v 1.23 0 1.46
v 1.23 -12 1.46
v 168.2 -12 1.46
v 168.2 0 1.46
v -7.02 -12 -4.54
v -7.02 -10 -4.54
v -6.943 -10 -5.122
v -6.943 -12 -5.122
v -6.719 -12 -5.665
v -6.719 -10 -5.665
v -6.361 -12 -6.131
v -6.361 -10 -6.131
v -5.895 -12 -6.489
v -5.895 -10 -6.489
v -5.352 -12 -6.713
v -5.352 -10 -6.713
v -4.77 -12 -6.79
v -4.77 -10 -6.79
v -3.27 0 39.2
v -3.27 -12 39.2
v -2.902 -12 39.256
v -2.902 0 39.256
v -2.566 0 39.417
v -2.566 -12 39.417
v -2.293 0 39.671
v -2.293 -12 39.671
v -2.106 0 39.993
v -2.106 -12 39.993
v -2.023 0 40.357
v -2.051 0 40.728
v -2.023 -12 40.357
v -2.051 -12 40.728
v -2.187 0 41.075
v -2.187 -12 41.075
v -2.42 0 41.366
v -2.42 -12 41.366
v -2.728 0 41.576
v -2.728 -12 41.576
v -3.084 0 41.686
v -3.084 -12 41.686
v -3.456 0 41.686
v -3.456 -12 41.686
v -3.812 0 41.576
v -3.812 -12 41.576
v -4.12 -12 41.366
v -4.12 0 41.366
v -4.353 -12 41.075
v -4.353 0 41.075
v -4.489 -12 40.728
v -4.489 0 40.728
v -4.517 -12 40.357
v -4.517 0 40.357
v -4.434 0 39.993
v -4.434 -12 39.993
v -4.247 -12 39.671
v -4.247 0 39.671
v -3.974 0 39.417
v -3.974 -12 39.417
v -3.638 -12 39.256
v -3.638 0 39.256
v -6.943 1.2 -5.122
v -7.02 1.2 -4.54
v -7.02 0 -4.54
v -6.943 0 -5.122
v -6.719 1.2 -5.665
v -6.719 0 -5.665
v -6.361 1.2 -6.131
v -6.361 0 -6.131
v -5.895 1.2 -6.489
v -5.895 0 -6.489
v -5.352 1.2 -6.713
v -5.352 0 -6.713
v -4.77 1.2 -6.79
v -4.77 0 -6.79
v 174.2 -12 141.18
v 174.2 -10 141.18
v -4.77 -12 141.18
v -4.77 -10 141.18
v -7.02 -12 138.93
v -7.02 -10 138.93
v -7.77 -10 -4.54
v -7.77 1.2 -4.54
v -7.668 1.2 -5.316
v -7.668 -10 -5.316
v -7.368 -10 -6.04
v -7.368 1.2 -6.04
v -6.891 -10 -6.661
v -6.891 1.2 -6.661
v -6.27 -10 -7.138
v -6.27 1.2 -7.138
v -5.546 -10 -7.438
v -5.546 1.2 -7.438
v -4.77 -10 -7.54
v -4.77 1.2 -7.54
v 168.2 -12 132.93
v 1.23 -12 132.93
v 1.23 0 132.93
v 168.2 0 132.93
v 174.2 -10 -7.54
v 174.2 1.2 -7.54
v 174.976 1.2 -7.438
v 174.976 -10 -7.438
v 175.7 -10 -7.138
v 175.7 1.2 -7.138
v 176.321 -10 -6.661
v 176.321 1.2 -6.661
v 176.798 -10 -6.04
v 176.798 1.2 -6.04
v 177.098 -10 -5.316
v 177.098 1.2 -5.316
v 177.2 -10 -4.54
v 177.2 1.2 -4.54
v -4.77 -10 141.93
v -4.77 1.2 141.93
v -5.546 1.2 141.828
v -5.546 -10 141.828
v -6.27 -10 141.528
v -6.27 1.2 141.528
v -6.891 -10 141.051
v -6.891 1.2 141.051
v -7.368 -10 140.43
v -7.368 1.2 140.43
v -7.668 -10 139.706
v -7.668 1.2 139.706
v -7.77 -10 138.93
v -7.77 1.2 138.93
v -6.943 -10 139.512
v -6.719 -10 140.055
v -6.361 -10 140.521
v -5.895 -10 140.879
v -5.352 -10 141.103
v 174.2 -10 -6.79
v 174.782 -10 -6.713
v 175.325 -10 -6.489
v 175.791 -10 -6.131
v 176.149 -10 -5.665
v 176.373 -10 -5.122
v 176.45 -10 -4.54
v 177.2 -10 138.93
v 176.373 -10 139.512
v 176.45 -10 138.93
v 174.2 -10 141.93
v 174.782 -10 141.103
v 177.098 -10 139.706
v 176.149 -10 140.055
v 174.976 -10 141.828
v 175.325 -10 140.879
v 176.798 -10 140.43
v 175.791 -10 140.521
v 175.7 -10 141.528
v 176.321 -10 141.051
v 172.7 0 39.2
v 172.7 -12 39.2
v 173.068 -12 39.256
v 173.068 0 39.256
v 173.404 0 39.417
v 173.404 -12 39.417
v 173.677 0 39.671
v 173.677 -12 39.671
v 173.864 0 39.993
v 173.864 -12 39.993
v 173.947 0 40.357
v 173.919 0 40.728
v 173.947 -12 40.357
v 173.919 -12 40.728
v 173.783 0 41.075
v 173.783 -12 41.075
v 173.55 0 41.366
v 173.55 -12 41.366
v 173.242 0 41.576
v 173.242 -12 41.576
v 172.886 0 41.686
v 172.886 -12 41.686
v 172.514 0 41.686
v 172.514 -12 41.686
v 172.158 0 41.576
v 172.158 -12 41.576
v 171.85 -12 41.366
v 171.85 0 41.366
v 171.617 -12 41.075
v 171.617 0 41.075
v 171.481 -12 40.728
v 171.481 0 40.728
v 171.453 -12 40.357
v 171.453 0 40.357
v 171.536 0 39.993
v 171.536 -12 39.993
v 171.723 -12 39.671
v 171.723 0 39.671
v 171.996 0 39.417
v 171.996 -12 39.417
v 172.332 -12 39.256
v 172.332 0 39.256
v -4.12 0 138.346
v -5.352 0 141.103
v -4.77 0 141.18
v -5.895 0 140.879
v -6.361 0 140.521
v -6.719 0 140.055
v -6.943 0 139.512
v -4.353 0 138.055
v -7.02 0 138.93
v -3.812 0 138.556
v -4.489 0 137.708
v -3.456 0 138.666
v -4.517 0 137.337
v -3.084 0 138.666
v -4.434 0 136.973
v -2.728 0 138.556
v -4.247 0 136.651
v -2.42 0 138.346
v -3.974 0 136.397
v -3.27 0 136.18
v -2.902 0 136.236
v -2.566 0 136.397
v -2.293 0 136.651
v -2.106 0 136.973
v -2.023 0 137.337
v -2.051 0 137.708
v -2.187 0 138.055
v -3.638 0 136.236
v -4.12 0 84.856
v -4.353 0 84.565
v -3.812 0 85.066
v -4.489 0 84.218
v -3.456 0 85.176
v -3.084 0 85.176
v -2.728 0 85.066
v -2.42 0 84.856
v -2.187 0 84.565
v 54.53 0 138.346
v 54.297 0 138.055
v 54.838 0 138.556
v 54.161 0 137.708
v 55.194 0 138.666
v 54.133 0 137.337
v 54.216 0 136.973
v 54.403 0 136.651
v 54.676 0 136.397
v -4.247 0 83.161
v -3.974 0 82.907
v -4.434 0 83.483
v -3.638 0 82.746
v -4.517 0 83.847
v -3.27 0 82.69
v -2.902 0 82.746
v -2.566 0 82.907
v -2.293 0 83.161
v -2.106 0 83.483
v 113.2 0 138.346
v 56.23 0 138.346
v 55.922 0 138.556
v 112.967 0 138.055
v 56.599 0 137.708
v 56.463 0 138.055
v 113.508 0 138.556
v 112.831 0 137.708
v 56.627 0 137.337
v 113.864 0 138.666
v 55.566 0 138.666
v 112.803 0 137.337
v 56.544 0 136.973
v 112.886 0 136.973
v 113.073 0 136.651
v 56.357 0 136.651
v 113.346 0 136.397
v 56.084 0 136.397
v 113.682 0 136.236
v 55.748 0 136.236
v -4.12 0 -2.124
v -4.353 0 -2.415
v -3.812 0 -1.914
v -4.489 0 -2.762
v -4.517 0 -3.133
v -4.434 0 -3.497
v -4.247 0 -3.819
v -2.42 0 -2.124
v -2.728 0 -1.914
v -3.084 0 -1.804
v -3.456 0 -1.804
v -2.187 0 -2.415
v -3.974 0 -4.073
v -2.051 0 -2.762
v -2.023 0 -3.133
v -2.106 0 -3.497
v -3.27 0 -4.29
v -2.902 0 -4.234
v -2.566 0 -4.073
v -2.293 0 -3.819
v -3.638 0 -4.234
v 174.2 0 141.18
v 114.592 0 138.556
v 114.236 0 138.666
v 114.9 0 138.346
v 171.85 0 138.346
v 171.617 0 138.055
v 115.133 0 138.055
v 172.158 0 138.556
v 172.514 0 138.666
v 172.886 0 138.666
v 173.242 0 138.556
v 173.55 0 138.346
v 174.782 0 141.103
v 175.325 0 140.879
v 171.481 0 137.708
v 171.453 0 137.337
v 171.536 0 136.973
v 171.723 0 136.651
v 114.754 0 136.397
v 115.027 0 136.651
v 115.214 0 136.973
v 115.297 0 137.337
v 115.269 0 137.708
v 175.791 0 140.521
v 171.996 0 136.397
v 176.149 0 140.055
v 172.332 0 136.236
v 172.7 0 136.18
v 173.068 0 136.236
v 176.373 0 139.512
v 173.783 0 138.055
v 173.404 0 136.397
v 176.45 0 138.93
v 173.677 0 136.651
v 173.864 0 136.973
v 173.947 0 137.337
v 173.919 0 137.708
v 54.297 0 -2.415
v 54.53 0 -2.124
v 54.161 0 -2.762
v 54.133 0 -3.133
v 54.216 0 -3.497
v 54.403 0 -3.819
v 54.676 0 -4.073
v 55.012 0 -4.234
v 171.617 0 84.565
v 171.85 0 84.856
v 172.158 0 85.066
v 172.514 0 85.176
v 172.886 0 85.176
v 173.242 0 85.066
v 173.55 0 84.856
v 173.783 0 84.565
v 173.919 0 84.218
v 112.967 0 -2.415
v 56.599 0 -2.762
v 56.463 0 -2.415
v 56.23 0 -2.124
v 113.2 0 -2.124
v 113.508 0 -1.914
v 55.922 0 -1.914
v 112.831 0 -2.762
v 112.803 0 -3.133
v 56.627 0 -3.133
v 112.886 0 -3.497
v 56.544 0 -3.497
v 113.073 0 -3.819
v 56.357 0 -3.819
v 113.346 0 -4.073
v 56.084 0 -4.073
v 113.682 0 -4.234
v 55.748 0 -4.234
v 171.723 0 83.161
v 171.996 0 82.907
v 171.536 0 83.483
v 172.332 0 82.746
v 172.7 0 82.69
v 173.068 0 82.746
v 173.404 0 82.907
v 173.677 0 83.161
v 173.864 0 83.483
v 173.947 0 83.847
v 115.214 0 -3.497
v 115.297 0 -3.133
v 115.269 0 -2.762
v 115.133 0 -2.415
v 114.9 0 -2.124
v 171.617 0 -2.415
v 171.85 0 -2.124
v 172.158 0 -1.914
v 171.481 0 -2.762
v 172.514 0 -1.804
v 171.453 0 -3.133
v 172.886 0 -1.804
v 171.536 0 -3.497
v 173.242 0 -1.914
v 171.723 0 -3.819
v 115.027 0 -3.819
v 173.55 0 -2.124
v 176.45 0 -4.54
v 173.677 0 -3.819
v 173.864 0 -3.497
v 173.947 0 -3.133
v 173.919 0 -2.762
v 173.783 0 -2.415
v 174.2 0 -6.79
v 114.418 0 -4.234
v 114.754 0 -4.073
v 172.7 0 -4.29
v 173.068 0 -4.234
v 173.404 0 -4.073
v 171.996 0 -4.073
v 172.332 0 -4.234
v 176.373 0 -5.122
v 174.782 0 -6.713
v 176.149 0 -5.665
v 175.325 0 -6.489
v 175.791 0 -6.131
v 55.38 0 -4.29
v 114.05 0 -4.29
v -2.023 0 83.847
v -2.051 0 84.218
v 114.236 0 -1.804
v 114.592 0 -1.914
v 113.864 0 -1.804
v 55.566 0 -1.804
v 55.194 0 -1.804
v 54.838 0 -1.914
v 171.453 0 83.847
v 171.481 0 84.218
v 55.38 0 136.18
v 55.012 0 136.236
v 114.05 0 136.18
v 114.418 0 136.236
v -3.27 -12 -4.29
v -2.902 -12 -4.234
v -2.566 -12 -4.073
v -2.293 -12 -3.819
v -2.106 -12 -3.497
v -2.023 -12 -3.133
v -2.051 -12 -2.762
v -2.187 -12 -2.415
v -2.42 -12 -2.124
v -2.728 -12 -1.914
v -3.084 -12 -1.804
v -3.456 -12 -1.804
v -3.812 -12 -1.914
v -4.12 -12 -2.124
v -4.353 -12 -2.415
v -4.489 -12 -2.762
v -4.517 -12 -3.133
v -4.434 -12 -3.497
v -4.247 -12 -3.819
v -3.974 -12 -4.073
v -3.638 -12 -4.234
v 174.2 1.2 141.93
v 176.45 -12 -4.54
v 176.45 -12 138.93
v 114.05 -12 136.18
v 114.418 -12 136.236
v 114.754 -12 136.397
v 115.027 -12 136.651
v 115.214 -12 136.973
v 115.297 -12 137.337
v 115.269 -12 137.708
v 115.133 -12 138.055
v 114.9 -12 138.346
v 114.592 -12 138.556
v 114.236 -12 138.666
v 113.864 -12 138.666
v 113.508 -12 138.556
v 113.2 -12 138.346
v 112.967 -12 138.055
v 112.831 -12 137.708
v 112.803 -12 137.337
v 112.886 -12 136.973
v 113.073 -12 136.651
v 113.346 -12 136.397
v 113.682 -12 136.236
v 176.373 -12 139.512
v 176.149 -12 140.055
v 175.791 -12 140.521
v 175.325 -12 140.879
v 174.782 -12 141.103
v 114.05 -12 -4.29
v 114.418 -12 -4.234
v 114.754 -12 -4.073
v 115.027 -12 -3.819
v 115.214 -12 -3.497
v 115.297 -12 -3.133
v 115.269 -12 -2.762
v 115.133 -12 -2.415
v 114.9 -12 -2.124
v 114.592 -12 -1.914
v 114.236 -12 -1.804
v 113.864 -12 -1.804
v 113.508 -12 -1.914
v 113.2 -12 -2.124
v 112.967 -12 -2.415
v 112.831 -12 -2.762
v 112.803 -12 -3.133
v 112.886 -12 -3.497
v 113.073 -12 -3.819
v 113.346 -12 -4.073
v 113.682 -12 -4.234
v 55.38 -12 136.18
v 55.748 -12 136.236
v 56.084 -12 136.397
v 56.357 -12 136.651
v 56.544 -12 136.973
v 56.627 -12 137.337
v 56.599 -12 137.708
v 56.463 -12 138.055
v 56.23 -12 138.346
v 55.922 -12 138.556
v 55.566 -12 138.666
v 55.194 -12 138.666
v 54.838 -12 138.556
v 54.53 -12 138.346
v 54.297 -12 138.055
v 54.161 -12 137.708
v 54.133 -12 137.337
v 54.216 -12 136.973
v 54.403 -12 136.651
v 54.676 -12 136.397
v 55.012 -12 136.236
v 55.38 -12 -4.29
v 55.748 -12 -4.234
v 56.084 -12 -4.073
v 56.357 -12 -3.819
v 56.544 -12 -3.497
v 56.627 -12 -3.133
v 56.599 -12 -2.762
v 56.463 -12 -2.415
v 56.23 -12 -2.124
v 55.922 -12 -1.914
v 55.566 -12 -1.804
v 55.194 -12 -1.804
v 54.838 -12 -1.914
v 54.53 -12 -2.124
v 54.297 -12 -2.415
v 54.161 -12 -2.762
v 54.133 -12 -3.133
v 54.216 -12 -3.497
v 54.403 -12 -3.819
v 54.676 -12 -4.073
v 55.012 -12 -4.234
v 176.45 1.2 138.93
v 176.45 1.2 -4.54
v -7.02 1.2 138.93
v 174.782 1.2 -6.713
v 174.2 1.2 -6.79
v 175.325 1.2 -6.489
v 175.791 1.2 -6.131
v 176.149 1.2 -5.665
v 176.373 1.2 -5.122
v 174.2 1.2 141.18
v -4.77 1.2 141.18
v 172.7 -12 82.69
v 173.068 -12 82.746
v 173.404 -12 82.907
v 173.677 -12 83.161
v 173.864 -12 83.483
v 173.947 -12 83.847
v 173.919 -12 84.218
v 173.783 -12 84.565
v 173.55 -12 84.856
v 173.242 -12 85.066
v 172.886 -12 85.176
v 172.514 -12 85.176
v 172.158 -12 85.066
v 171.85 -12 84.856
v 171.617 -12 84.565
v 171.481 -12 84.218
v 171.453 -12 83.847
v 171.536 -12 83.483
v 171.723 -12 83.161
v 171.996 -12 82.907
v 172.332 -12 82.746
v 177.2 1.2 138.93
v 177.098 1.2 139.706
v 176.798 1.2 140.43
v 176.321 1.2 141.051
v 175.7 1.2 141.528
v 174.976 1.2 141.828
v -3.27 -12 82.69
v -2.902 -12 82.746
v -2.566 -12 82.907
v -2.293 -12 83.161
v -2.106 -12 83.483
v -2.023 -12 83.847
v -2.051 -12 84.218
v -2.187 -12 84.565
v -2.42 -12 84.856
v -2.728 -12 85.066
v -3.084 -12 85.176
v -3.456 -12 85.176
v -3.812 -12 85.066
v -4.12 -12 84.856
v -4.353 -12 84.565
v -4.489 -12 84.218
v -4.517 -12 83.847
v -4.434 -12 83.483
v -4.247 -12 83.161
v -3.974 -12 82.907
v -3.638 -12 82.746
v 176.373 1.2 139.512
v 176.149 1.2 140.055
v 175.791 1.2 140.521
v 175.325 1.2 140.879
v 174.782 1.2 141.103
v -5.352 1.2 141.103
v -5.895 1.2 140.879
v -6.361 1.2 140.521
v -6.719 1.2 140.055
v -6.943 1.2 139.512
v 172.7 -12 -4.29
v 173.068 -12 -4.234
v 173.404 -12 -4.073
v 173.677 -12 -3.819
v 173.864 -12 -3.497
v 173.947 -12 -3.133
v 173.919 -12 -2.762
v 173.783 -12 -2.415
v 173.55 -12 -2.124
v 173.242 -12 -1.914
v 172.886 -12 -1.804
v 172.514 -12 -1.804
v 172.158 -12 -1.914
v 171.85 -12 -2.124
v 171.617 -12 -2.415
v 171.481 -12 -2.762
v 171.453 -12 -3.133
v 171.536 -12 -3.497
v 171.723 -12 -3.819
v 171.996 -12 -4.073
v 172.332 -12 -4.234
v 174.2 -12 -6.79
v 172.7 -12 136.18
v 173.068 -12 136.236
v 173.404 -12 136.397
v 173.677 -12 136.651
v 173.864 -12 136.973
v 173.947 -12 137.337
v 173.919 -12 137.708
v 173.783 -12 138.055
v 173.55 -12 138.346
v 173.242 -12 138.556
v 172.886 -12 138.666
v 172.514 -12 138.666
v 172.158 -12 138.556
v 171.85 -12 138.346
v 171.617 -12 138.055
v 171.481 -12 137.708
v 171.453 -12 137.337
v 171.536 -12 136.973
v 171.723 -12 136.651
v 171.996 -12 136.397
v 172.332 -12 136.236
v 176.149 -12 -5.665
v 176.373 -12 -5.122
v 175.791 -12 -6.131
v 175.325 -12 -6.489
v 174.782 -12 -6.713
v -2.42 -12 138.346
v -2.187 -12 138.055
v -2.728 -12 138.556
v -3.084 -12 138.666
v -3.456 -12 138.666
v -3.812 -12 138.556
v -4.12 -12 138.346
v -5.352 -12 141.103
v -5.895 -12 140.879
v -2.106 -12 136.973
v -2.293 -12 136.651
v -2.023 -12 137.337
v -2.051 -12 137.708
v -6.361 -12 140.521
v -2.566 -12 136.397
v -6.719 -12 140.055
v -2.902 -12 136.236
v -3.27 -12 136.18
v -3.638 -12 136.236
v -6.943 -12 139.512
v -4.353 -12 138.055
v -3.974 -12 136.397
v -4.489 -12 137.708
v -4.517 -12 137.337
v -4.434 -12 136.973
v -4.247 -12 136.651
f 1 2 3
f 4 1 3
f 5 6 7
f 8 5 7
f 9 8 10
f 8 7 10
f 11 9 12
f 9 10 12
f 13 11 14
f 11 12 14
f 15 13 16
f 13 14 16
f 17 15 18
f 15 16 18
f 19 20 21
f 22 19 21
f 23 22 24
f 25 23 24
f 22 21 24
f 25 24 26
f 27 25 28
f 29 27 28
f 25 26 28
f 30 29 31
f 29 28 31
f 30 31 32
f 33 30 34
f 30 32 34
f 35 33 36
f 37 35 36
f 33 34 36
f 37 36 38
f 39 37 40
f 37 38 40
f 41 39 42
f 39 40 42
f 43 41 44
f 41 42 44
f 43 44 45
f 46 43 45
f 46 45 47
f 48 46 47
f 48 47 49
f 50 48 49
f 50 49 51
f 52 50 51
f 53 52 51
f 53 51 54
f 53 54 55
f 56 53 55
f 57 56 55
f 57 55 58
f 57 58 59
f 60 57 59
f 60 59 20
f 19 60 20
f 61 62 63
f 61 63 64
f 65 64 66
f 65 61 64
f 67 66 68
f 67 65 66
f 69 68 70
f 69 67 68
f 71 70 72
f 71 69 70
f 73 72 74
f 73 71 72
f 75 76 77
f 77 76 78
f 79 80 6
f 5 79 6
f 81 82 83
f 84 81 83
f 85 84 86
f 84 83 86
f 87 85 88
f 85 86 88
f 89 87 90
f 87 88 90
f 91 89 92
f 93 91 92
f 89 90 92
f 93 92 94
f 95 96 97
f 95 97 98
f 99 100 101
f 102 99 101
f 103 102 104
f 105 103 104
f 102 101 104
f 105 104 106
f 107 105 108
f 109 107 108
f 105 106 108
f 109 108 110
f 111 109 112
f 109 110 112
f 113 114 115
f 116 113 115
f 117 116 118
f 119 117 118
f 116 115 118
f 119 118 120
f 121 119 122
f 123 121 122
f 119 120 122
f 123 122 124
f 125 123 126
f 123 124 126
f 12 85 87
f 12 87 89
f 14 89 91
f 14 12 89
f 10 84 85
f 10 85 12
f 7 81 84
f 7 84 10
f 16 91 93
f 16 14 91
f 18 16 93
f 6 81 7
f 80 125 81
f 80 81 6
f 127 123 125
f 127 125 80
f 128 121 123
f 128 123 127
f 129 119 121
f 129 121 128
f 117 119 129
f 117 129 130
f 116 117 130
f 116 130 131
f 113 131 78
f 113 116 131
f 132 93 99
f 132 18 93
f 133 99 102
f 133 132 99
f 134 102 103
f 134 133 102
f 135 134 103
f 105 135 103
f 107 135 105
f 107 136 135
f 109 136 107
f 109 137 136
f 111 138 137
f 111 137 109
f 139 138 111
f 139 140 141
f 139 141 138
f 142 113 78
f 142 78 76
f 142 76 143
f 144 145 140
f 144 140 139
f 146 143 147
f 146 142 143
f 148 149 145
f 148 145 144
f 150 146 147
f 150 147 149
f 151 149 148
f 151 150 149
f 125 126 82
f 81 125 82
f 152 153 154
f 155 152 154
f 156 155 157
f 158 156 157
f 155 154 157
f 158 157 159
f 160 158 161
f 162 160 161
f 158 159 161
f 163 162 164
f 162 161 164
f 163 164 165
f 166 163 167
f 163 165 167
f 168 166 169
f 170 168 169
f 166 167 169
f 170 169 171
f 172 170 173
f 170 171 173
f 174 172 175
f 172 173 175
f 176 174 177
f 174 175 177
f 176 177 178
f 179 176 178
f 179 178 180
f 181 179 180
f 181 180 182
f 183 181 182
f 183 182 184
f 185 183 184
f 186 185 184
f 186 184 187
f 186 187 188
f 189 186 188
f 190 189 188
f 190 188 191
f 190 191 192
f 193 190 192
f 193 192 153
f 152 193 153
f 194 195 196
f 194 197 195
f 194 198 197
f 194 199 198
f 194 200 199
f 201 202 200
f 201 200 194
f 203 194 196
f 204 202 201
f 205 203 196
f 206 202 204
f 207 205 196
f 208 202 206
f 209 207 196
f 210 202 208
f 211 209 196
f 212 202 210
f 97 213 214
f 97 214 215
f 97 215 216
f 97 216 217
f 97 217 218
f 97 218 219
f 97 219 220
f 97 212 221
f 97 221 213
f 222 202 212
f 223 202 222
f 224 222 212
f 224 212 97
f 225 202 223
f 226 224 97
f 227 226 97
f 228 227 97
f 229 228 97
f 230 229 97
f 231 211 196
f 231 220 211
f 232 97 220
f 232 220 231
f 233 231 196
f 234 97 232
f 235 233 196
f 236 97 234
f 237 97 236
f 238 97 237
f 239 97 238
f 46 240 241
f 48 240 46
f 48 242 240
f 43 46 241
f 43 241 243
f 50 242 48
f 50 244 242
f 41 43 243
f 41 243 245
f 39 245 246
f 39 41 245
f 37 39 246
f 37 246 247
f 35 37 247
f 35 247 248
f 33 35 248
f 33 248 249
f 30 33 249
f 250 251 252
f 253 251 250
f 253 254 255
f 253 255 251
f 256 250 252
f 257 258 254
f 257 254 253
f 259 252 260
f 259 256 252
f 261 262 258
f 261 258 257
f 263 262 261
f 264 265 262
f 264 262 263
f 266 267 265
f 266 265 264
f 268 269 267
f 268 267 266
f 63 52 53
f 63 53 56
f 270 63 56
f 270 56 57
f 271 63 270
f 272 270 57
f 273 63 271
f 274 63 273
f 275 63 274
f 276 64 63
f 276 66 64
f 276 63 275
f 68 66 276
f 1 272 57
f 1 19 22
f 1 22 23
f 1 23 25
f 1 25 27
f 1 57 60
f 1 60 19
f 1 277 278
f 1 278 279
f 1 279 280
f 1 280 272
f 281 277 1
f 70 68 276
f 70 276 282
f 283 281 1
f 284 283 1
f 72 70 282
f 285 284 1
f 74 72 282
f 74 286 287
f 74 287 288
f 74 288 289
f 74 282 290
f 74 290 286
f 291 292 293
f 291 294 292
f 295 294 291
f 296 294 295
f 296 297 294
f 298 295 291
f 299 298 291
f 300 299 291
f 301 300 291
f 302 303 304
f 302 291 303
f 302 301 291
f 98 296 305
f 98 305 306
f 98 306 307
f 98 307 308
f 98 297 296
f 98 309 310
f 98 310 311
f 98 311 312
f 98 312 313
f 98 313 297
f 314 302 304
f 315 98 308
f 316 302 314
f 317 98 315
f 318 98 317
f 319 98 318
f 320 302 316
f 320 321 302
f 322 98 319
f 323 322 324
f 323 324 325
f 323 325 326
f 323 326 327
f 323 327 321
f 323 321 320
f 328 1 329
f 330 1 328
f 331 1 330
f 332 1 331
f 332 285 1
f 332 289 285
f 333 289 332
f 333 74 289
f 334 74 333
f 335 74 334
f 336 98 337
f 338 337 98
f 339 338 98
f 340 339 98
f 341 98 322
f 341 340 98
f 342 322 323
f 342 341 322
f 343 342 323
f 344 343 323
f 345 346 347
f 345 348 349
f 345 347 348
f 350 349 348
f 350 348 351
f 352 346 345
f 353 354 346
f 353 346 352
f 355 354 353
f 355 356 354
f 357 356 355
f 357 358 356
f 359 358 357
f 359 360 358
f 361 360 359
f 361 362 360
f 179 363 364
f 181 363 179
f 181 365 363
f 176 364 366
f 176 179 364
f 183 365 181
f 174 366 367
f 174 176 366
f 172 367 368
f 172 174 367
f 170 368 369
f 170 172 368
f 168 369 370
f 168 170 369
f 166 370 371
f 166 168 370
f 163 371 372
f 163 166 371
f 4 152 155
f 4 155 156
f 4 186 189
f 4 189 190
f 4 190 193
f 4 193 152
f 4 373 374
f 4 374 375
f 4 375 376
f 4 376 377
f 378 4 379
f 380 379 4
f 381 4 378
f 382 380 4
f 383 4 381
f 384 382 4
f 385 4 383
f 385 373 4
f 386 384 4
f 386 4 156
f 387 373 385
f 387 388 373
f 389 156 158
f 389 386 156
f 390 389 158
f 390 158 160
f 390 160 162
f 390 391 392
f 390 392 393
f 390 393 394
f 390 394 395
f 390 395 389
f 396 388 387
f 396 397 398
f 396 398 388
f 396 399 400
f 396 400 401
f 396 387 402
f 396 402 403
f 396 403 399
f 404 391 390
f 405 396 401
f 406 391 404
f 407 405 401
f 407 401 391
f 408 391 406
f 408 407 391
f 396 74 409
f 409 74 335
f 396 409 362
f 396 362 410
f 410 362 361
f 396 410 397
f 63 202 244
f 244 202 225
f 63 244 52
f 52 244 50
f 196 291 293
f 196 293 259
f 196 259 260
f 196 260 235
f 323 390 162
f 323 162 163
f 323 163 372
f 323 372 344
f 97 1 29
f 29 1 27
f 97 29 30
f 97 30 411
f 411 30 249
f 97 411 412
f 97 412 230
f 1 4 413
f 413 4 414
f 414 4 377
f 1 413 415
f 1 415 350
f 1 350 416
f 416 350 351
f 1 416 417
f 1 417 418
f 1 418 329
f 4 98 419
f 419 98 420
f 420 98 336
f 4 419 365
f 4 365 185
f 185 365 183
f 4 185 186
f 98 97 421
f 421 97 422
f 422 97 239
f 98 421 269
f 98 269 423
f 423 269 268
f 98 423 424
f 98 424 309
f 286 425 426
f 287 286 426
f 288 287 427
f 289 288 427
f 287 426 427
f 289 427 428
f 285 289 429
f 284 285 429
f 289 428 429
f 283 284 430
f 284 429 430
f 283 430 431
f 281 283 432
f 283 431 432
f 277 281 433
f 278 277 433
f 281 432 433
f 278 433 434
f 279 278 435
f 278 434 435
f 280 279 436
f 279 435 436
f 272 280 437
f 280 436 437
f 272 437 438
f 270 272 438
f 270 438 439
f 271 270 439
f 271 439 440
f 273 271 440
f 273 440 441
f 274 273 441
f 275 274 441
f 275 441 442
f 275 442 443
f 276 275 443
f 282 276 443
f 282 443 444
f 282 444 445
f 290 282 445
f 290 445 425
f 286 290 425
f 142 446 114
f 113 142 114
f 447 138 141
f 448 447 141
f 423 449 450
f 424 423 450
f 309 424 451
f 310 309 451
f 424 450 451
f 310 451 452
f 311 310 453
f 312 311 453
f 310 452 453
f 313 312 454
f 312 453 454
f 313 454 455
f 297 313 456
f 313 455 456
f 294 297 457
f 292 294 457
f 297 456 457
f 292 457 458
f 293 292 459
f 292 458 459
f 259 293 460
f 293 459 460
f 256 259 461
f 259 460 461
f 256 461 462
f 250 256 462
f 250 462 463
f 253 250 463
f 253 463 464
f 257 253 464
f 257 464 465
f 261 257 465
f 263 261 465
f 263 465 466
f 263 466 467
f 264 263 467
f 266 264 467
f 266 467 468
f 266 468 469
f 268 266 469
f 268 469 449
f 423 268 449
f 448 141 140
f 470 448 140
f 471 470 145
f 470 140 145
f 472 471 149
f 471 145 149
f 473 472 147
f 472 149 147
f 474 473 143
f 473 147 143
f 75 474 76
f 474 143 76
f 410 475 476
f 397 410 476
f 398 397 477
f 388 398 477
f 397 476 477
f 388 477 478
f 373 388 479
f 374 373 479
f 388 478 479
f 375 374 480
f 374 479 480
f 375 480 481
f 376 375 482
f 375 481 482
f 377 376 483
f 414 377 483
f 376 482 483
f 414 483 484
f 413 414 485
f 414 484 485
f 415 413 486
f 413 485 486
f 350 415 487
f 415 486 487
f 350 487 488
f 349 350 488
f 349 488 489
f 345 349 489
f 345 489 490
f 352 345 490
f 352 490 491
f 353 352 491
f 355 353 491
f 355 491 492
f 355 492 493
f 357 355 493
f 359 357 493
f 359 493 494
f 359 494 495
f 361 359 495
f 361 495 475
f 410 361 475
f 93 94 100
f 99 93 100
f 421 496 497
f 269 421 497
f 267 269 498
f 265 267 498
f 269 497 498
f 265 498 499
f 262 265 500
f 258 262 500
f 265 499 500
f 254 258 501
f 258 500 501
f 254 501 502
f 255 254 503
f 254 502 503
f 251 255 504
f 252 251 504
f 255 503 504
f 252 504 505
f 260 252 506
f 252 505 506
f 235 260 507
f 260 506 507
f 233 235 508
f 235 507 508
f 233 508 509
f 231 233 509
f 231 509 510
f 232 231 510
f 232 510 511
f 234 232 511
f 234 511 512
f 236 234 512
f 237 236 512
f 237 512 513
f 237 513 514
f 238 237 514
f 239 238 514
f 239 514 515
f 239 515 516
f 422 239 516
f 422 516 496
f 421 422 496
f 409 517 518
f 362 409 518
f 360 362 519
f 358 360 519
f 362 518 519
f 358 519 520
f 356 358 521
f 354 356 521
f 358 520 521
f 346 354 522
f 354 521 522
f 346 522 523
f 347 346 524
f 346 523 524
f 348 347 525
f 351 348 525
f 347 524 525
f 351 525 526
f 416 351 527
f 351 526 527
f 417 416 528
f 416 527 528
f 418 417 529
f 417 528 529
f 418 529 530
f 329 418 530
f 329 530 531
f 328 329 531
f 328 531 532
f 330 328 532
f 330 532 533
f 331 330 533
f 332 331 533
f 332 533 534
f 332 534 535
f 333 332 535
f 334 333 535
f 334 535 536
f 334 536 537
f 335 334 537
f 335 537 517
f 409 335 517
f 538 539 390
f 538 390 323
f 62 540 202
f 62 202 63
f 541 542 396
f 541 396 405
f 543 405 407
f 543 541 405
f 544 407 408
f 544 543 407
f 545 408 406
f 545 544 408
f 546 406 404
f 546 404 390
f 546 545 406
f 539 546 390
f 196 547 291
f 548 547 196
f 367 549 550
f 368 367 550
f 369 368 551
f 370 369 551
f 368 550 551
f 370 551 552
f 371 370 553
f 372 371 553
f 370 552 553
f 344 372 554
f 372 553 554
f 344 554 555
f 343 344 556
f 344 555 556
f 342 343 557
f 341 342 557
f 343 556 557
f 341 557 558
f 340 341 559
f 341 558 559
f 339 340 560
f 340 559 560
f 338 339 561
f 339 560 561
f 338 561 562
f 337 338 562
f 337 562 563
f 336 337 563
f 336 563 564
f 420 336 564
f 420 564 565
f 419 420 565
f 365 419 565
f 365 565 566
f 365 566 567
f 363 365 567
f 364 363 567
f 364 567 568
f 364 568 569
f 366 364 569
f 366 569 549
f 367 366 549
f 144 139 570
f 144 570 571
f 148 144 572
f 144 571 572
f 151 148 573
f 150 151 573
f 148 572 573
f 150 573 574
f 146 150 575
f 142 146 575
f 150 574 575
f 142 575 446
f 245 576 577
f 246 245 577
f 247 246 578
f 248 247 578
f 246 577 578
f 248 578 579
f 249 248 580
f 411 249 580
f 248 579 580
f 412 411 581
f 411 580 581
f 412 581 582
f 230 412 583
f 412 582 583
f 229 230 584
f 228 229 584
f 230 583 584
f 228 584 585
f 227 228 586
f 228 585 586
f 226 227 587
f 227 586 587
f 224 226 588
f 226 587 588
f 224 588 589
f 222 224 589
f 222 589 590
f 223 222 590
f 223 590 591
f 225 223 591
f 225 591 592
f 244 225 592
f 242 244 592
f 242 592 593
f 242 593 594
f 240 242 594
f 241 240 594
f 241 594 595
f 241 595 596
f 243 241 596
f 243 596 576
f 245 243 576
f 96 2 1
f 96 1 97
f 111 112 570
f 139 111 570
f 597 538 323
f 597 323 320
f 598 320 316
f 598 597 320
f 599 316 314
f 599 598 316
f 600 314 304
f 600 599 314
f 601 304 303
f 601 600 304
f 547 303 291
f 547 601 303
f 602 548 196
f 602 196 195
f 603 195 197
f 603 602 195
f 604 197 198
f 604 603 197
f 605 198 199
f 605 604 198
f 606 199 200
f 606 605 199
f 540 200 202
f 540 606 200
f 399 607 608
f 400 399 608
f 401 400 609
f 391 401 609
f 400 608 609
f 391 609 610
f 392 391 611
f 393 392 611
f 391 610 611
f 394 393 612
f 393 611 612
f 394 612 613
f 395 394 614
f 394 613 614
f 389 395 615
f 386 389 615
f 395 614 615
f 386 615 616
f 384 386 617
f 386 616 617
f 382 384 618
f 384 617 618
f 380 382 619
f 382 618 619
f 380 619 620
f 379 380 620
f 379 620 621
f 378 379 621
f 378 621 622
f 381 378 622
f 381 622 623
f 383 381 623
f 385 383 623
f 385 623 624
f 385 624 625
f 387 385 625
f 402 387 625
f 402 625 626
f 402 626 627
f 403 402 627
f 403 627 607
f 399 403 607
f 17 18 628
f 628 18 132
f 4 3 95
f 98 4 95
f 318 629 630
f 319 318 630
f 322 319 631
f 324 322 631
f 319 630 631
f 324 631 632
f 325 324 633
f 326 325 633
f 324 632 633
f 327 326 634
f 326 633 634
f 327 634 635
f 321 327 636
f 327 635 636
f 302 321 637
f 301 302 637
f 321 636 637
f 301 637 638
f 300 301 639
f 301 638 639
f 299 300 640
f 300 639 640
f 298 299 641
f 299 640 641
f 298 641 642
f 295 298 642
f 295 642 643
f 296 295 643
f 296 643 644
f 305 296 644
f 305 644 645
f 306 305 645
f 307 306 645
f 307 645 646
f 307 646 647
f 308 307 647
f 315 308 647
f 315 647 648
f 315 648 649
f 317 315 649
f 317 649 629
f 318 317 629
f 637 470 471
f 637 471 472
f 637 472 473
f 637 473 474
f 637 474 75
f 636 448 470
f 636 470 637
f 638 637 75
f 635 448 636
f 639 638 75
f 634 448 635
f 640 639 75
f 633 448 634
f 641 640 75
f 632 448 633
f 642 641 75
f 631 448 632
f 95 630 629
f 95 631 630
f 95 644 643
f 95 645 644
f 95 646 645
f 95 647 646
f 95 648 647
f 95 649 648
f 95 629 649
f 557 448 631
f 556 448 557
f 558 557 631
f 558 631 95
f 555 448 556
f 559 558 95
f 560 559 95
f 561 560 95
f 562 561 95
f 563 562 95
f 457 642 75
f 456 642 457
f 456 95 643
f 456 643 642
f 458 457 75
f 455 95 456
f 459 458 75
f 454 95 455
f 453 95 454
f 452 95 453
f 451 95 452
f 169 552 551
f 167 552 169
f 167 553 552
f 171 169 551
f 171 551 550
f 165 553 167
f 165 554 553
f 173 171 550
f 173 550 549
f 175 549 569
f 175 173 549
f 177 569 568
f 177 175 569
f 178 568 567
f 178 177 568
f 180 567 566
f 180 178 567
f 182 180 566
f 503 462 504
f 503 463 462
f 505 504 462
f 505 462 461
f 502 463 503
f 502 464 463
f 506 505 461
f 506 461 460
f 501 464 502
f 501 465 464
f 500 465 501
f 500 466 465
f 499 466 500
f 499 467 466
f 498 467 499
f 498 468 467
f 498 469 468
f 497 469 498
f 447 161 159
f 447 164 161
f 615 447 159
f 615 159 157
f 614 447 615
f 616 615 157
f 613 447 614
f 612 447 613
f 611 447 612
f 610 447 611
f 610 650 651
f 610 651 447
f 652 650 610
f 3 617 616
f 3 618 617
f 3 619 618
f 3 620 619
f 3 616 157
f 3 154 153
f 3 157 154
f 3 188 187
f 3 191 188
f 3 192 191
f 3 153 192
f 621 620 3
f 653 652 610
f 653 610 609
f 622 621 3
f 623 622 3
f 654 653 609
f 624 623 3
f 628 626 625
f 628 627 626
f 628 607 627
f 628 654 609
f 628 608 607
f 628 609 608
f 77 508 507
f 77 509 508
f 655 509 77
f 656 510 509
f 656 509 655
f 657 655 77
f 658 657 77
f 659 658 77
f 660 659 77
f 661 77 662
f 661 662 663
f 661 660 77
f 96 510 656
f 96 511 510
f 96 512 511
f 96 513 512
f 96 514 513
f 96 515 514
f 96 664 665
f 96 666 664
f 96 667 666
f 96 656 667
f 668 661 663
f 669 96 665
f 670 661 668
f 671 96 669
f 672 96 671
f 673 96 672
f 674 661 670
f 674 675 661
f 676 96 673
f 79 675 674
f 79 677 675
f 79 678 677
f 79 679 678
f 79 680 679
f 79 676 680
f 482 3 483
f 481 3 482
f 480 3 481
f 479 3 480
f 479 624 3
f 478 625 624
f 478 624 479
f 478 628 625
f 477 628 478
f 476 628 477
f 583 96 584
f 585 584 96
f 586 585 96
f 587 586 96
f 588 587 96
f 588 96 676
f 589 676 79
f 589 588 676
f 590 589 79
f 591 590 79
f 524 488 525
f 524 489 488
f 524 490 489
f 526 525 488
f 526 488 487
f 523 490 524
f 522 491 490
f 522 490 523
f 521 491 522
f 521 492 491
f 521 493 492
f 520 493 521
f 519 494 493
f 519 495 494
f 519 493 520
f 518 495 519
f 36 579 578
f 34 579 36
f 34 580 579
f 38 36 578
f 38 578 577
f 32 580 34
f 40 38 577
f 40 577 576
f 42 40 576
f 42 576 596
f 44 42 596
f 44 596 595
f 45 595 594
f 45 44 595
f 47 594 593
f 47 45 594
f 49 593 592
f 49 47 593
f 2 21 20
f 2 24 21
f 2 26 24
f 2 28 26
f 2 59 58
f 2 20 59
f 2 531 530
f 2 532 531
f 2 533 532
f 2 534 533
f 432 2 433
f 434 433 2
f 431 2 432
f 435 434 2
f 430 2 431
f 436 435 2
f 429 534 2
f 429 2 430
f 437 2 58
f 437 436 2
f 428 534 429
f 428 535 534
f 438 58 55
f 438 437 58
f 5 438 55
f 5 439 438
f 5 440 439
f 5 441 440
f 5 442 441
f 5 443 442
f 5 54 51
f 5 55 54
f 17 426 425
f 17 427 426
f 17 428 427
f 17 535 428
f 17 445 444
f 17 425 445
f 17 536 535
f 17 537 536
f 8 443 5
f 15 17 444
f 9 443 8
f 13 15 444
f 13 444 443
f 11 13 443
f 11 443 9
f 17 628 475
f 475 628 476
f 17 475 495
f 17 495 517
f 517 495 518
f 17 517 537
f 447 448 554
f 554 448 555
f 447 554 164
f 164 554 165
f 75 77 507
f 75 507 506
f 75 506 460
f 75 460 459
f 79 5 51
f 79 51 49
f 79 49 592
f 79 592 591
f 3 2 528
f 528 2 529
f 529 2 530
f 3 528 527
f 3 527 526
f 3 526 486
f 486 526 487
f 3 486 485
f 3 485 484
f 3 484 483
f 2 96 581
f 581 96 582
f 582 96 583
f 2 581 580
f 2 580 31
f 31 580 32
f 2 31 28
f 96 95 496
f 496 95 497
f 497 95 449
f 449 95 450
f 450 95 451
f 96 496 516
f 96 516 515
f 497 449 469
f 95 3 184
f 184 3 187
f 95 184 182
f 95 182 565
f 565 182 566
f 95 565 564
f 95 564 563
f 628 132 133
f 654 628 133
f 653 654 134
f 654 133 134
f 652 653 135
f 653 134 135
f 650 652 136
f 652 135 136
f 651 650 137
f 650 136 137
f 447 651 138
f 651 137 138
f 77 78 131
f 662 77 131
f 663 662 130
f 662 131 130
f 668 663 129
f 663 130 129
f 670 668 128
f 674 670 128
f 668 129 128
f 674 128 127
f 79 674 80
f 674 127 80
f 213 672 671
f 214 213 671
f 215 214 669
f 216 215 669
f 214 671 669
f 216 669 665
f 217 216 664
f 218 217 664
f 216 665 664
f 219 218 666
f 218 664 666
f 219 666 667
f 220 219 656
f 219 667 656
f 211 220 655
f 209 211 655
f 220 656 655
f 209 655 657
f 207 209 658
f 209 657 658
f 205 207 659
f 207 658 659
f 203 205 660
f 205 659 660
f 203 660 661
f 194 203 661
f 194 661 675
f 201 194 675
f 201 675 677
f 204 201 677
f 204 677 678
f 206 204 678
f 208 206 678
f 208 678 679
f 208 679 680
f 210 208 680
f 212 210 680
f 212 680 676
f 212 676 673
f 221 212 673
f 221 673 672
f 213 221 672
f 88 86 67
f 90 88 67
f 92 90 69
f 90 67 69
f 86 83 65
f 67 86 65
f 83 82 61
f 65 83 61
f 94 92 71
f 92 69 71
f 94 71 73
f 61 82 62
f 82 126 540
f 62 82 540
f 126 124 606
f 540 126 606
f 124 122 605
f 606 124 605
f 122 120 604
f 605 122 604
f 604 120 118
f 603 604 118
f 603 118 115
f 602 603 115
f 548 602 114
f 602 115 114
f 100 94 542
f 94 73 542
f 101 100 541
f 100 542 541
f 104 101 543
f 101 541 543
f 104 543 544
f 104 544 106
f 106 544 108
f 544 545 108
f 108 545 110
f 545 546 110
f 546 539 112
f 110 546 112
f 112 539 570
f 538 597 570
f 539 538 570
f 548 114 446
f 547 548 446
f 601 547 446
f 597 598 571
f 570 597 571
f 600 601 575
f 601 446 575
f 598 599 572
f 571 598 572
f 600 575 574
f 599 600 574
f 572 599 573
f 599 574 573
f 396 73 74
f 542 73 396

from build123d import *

# Parameters (mm, degrees)
SKETCH1_W           = 164.87
SKETCH1_H           = 104.3
SKETCH1_W_2         = 154.97
SKETCH1_H_2         = 94.47
BOSS_EXTRUDE1_DEPTH = 12
CUT_EXTRUDE3_REACH  = 229.35
SKETCH2_R           = 1.25
BOSS_EXTRUDE2_START = -13.2
BOSS_EXTRUDE2_DEPTH = 1.2
CUT_EXTRUDE4_REACH  = 229.416
SKETCH13_W          = 166.97
SKETCH13_H          = 131.47
CUT_EXTRUDE5_START  = -2
CUT_EXTRUDE5_DEPTH  = 2


with BuildPart() as part:
    # Sketch1 → Boss-Extrude1 (new body)
    # profile 1 of 3: a face of its own
    with BuildSketch(Plane(origin=(0, 0, 0), x_dir=(1, 0, 0), z_dir=(0, 1, 0))):
        with BuildLine():
            ThreePointArc((174.2, 7.54), (176.321320344, 6.661320344), (177.2, 4.54))
            Line((177.2, 4.54), (177.2, -138.93))
            ThreePointArc((177.2, -138.93), (176.321320344, -141.051320344), (174.2, -141.93))
            Line((174.2, -141.93), (-4.77, -141.93))
            ThreePointArc((-4.77, -141.93), (-6.891320344, -141.051320344), (-7.77, -138.93))
            Line((-7.77, -138.93), (-7.77, 4.54))
            ThreePointArc((-7.77, 4.54), (-6.891320344, 6.661320344), (-4.77, 7.54))
            Line((-4.77, 7.54), (174.2, 7.54))
        make_face()
        with Locations((82.435, -52.15)):
            Rectangle(SKETCH1_W, SKETCH1_H, mode=Mode.SUBTRACT)
    # profile 2 of 3: a face of its own
    with BuildSketch(Plane(origin=(0, 0, 0), x_dir=(1, 0, 0), z_dir=(0, 1, 0))):
        with Locations((82.435, -52.15)):
            Rectangle(SKETCH1_W, SKETCH1_H)
        with Locations((84.715, -54.695)):
            Rectangle(SKETCH1_W_2, SKETCH1_H_2, mode=Mode.SUBTRACT)
    # profile 3 of 3: a face of its own
    with BuildSketch(Plane(origin=(0, 0, 0), x_dir=(1, 0, 0), z_dir=(0, 1, 0))):
        with Locations((84.715, -54.695)):
            Rectangle(SKETCH1_W_2, SKETCH1_H_2)
    extrude(amount=-BOSS_EXTRUDE1_DEPTH)

    # Sketch2 → Cut-Extrude3 (cut, up to next)
    with BuildSketch(Plane.XZ.offset(12), mode=Mode.PRIVATE) as cut_extrude3_sk1:
        with Locations(Location((172.7, -3.04, 0), (0, 0, 270))):
            Circle(SKETCH2_R)
    cut_extrude3_tool1 = extrude(cut_extrude3_sk1.sketch, amount=-CUT_EXTRUDE3_REACH, mode=Mode.PRIVATE) & part.part
    # Sketch2 → Cut-Extrude3 (cut, up to next)
    with BuildSketch(Plane.XZ.offset(12), mode=Mode.PRIVATE) as cut_extrude3_sk2:
        with Locations(Location((114.05, -3.04, 0), (0, 0, 270))):
            Circle(SKETCH2_R)
    cut_extrude3_tool2 = extrude(cut_extrude3_sk2.sketch, amount=-CUT_EXTRUDE3_REACH, mode=Mode.PRIVATE) & part.part
    # Sketch2 → Cut-Extrude3 (cut, up to next)
    with BuildSketch(Plane.XZ.offset(12), mode=Mode.PRIVATE) as cut_extrude3_sk3:
        with Locations(Location((-3.27, -3.04, 0), (0, 0, 270))):
            Circle(SKETCH2_R)
    cut_extrude3_tool3 = extrude(cut_extrude3_sk3.sketch, amount=-CUT_EXTRUDE3_REACH, mode=Mode.PRIVATE) & part.part
    # Sketch2 → Cut-Extrude3 (cut, up to next)
    with BuildSketch(Plane.XZ.offset(12), mode=Mode.PRIVATE) as cut_extrude3_sk4:
        with Locations(Location((-3.27, 83.94, 0), (0, 0, 270))):
            Circle(SKETCH2_R)
    cut_extrude3_tool4 = extrude(cut_extrude3_sk4.sketch, amount=-CUT_EXTRUDE3_REACH, mode=Mode.PRIVATE) & part.part
    # Sketch2 → Cut-Extrude3 (cut, up to next)
    with BuildSketch(Plane.XZ.offset(12), mode=Mode.PRIVATE) as cut_extrude3_sk5:
        with Locations(Location((-3.27, 137.43, 0), (0, 0, 270))):
            Circle(SKETCH2_R)
    cut_extrude3_tool5 = extrude(cut_extrude3_sk5.sketch, amount=-CUT_EXTRUDE3_REACH, mode=Mode.PRIVATE) & part.part
    # Sketch2 → Cut-Extrude3 (cut, up to next)
    with BuildSketch(Plane.XZ.offset(12), mode=Mode.PRIVATE) as cut_extrude3_sk6:
        with Locations(Location((55.38, 137.43, 0), (0, 0, 270))):
            Circle(SKETCH2_R)
    cut_extrude3_tool6 = extrude(cut_extrude3_sk6.sketch, amount=-CUT_EXTRUDE3_REACH, mode=Mode.PRIVATE) & part.part
    # Sketch2 → Cut-Extrude3 (cut, up to next)
    with BuildSketch(Plane.XZ.offset(12), mode=Mode.PRIVATE) as cut_extrude3_sk7:
        with Locations(Location((114.05, 137.43, 0), (0, 0, 270))):
            Circle(SKETCH2_R)
    cut_extrude3_tool7 = extrude(cut_extrude3_sk7.sketch, amount=-CUT_EXTRUDE3_REACH, mode=Mode.PRIVATE) & part.part
    # Sketch2 → Cut-Extrude3 (cut, up to next)
    with BuildSketch(Plane.XZ.offset(12), mode=Mode.PRIVATE) as cut_extrude3_sk8:
        with Locations(Location((172.7, 137.43, 0), (0, 0, 270))):
            Circle(SKETCH2_R)
    cut_extrude3_tool8 = extrude(cut_extrude3_sk8.sketch, amount=-CUT_EXTRUDE3_REACH, mode=Mode.PRIVATE) & part.part
    # Sketch2 → Cut-Extrude3 (cut, up to next)
    with BuildSketch(Plane.XZ.offset(12), mode=Mode.PRIVATE) as cut_extrude3_sk9:
        with Locations(Location((172.7, 83.94, 0), (0, 0, 270))):
            Circle(SKETCH2_R)
    cut_extrude3_tool9 = extrude(cut_extrude3_sk9.sketch, amount=-CUT_EXTRUDE3_REACH, mode=Mode.PRIVATE) & part.part
    # Sketch2 → Cut-Extrude3 (cut, up to next)
    with BuildSketch(Plane.XZ.offset(12), mode=Mode.PRIVATE) as cut_extrude3_sk10:
        with Locations(Location((172.7, 40.45, 0), (0, 0, 270))):
            Circle(SKETCH2_R)
    cut_extrude3_tool10 = extrude(cut_extrude3_sk10.sketch, amount=-CUT_EXTRUDE3_REACH, mode=Mode.PRIVATE) & part.part
    # Sketch2 → Cut-Extrude3 (cut, up to next)
    with BuildSketch(Plane.XZ.offset(12), mode=Mode.PRIVATE) as cut_extrude3_sk11:
        with Locations(Location((55.38, -3.04, 0), (0, 0, 270))):
            Circle(SKETCH2_R)
    cut_extrude3_tool11 = extrude(cut_extrude3_sk11.sketch, amount=-CUT_EXTRUDE3_REACH, mode=Mode.PRIVATE) & part.part
    # Sketch2 → Cut-Extrude3 (cut, up to next)
    with BuildSketch(Plane.XZ.offset(12), mode=Mode.PRIVATE) as cut_extrude3_sk12:
        with Locations(Location((-3.27, 40.45, 0), (0, 0, 270))):
            Circle(SKETCH2_R)
    cut_extrude3_tool12 = extrude(cut_extrude3_sk12.sketch, amount=-CUT_EXTRUDE3_REACH, mode=Mode.PRIVATE) & part.part
    add(cut_extrude3_tool1.solids().sort_by_distance((172.7, -12, -3.04))[0], mode=Mode.SUBTRACT)
    add(cut_extrude3_tool2.solids().sort_by_distance((114.05, -12, -3.04))[0], mode=Mode.SUBTRACT)
    add(cut_extrude3_tool3.solids().sort_by_distance((-3.27, -12, -3.04))[0], mode=Mode.SUBTRACT)
    add(cut_extrude3_tool4.solids().sort_by_distance((-3.27, -12, 83.94))[0], mode=Mode.SUBTRACT)
    add(cut_extrude3_tool5.solids().sort_by_distance((-3.27, -12, 137.43))[0], mode=Mode.SUBTRACT)
    add(cut_extrude3_tool6.solids().sort_by_distance((55.38, -12, 137.43))[0], mode=Mode.SUBTRACT)
    add(cut_extrude3_tool7.solids().sort_by_distance((114.05, -12, 137.43))[0], mode=Mode.SUBTRACT)
    add(cut_extrude3_tool8.solids().sort_by_distance((172.7, -12, 137.43))[0], mode=Mode.SUBTRACT)
    add(cut_extrude3_tool9.solids().sort_by_distance((172.7, -12, 83.94))[0], mode=Mode.SUBTRACT)
    add(cut_extrude3_tool10.solids().sort_by_distance((172.7, -12, 40.45))[0], mode=Mode.SUBTRACT)
    add(cut_extrude3_tool11.solids().sort_by_distance((55.38, -12, -3.04))[0], mode=Mode.SUBTRACT)
    add(cut_extrude3_tool12.solids().sort_by_distance((-3.27, -12, 40.45))[0], mode=Mode.SUBTRACT)

    # Sketch12 → Boss-Extrude2 (add)
    with BuildSketch(Plane.XZ.offset(12).offset(BOSS_EXTRUDE2_START)):
        with BuildLine():
            Line((-4.77, -7.54), (174.2, -7.54))
            ThreePointArc((174.2, -7.54), (176.321320344, -6.661320344), (177.2, -4.54))
            Line((177.2, -4.54), (177.2, 138.93))
            ThreePointArc((177.2, 138.93), (176.321320344, 141.051320344), (174.2, 141.93))
            Line((174.2, 141.93), (-4.77, 141.93))
            ThreePointArc((-4.77, 141.93), (-6.891320344, 141.051320344), (-7.77, 138.93))
            Line((-7.77, 138.93), (-7.77, -4.54))
            ThreePointArc((-7.77, -4.54), (-6.891320344, -6.661320344), (-4.77, -7.54))
        make_face()
        with BuildLine():
            ThreePointArc((174.2, -6.79), (175.790990258, -6.130990258), (176.45, -4.54))
            Line((176.45, -4.54), (176.45, 138.93))
            ThreePointArc((176.45, 138.93), (175.790990258, 140.520990258), (174.2, 141.18))
            Line((174.2, 141.18), (-4.77, 141.18))
            ThreePointArc((-4.77, 141.18), (-6.360990258, 140.520990258), (-7.02, 138.93))
            Line((-7.02, 138.93), (-7.02, -4.54))
            ThreePointArc((-7.02, -4.54), (-6.360990258, -6.130990258), (-4.77, -6.79))
            Line((-4.77, -6.79), (174.2, -6.79))
        make_face(mode=Mode.SUBTRACT)
    extrude(amount=BOSS_EXTRUDE2_DEPTH)

    # Sketch13 → Cut-Extrude4 (cut, up to next)
    with BuildSketch(Plane.XZ.offset(12), mode=Mode.PRIVATE) as cut_extrude4_sk1:
        with Locations((84.715, 67.195)):
            Rectangle(SKETCH13_W, SKETCH13_H)
    cut_extrude4_tool1 = extrude(cut_extrude4_sk1.sketch, amount=-CUT_EXTRUDE4_REACH, mode=Mode.PRIVATE) & part.part
    add(cut_extrude4_tool1.solids().sort_by_distance((84.715, -12, 67.195))[0], mode=Mode.SUBTRACT)

    # Sketch12<4> → Cut-Extrude5 (cut)
    with BuildSketch(Plane.XZ.offset(12).offset(CUT_EXTRUDE5_START)):
        with BuildLine():
            Line((-4.77, -7.54), (174.2, -7.54))
            ThreePointArc((174.2, -7.54), (176.321320344, -6.661320344), (177.2, -4.54))
            Line((177.2, -4.54), (177.2, 138.93))
            ThreePointArc((177.2, 138.93), (176.321320344, 141.051320344), (174.2, 141.93))
            Line((174.2, 141.93), (-4.77, 141.93))
            ThreePointArc((-4.77, 141.93), (-6.891320344, 141.051320344), (-7.77, 138.93))
            Line((-7.77, 138.93), (-7.77, -4.54))
            ThreePointArc((-7.77, -4.54), (-6.891320344, -6.661320344), (-4.77, -7.54))
        make_face()
        with BuildLine():
            ThreePointArc((174.2, -6.79), (175.790990258, -6.130990258), (176.45, -4.54))
            Line((176.45, -4.54), (176.45, 138.93))
            ThreePointArc((176.45, 138.93), (175.790990258, 140.520990258), (174.2, 141.18))
            Line((174.2, 141.18), (-4.77, 141.18))
            ThreePointArc((-4.77, 141.18), (-6.360990258, 140.520990258), (-7.02, 138.93))
            Line((-7.02, 138.93), (-7.02, -4.54))
            ThreePointArc((-7.02, -4.54), (-6.360990258, -6.130990258), (-4.77, -6.79))
            Line((-4.77, -6.79), (174.2, -6.79))
        make_face(mode=Mode.SUBTRACT)
    extrude(amount=CUT_EXTRUDE5_DEPTH, mode=Mode.SUBTRACT)


solid = part.part
